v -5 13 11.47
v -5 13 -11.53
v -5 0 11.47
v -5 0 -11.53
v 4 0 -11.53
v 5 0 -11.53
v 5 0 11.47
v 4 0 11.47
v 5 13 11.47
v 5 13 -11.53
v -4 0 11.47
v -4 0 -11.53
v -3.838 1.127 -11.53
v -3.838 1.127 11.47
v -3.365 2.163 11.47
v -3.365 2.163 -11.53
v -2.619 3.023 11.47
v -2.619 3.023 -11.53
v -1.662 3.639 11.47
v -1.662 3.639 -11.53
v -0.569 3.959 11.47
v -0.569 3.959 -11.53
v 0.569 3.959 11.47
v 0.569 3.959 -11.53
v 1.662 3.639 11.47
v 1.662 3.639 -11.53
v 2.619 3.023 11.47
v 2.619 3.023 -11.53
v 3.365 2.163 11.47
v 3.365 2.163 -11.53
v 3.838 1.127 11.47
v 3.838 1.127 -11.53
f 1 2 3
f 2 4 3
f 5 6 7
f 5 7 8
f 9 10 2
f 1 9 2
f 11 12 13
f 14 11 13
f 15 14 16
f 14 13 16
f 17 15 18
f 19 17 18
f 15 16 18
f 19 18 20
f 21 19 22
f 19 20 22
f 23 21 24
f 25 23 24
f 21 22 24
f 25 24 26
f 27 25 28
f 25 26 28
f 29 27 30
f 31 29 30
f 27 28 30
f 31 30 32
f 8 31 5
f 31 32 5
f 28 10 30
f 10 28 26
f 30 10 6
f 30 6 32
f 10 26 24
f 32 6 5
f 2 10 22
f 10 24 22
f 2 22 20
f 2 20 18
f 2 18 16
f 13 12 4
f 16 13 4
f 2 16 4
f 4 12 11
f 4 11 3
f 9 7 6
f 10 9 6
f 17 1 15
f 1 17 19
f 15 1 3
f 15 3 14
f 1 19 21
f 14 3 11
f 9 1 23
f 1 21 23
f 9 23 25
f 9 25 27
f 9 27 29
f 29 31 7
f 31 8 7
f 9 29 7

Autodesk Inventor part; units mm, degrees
ref_plane "YZ Plane" through (0, 0, 0) normal (1, 0, 0) x (0, 1, 0)
ref_plane "XZ Plane" through (0, 0, 0) normal (0, 1, 0) x (-1, 0, 0)
ref_plane "XY Plane" through (0, 0, 0) normal (0, 0, 1) x (1, 0, 0)
sketch "Sketch1" plane through (0, 0, 0) normal (0, 1, 0) x (-1, 0, 0)
  line L0 (5, 11.4699) -> (-5, 11.4699)
  line L1 (-5, 11.4699) -> (-5, -11.5301)
  line L2 (-5, -11.5301) -> (5, -11.5301)
  line L3 (5, -11.5301) -> (5, 11.4699)
  line L4 (0, 11.4699) -> (0, -11.5301) construction
  line L5 (5, 0.0301) -> (-5, -0.0301) construction
  point P0 (0, 0)
  point P1 (0, 0)
  point P2 (0, -0.0301)
  dimension "d0" = 10
  dimension "d1" = 23
extrude "Extrusion1" add sketch "Sketch1" along normal blind 13
sketch "Sketch4" plane through (-5, 0, 11.4699) normal (0, 0, 1) x (1, 0, 0)
  circle A0 centre (5, 0) radius 4
  dimension "d11" = 8
hole "Hole1" at (0, 0, 11.4699) direction (0, 0, -1) diameter 8 end through all
properties part number "arm_block"
